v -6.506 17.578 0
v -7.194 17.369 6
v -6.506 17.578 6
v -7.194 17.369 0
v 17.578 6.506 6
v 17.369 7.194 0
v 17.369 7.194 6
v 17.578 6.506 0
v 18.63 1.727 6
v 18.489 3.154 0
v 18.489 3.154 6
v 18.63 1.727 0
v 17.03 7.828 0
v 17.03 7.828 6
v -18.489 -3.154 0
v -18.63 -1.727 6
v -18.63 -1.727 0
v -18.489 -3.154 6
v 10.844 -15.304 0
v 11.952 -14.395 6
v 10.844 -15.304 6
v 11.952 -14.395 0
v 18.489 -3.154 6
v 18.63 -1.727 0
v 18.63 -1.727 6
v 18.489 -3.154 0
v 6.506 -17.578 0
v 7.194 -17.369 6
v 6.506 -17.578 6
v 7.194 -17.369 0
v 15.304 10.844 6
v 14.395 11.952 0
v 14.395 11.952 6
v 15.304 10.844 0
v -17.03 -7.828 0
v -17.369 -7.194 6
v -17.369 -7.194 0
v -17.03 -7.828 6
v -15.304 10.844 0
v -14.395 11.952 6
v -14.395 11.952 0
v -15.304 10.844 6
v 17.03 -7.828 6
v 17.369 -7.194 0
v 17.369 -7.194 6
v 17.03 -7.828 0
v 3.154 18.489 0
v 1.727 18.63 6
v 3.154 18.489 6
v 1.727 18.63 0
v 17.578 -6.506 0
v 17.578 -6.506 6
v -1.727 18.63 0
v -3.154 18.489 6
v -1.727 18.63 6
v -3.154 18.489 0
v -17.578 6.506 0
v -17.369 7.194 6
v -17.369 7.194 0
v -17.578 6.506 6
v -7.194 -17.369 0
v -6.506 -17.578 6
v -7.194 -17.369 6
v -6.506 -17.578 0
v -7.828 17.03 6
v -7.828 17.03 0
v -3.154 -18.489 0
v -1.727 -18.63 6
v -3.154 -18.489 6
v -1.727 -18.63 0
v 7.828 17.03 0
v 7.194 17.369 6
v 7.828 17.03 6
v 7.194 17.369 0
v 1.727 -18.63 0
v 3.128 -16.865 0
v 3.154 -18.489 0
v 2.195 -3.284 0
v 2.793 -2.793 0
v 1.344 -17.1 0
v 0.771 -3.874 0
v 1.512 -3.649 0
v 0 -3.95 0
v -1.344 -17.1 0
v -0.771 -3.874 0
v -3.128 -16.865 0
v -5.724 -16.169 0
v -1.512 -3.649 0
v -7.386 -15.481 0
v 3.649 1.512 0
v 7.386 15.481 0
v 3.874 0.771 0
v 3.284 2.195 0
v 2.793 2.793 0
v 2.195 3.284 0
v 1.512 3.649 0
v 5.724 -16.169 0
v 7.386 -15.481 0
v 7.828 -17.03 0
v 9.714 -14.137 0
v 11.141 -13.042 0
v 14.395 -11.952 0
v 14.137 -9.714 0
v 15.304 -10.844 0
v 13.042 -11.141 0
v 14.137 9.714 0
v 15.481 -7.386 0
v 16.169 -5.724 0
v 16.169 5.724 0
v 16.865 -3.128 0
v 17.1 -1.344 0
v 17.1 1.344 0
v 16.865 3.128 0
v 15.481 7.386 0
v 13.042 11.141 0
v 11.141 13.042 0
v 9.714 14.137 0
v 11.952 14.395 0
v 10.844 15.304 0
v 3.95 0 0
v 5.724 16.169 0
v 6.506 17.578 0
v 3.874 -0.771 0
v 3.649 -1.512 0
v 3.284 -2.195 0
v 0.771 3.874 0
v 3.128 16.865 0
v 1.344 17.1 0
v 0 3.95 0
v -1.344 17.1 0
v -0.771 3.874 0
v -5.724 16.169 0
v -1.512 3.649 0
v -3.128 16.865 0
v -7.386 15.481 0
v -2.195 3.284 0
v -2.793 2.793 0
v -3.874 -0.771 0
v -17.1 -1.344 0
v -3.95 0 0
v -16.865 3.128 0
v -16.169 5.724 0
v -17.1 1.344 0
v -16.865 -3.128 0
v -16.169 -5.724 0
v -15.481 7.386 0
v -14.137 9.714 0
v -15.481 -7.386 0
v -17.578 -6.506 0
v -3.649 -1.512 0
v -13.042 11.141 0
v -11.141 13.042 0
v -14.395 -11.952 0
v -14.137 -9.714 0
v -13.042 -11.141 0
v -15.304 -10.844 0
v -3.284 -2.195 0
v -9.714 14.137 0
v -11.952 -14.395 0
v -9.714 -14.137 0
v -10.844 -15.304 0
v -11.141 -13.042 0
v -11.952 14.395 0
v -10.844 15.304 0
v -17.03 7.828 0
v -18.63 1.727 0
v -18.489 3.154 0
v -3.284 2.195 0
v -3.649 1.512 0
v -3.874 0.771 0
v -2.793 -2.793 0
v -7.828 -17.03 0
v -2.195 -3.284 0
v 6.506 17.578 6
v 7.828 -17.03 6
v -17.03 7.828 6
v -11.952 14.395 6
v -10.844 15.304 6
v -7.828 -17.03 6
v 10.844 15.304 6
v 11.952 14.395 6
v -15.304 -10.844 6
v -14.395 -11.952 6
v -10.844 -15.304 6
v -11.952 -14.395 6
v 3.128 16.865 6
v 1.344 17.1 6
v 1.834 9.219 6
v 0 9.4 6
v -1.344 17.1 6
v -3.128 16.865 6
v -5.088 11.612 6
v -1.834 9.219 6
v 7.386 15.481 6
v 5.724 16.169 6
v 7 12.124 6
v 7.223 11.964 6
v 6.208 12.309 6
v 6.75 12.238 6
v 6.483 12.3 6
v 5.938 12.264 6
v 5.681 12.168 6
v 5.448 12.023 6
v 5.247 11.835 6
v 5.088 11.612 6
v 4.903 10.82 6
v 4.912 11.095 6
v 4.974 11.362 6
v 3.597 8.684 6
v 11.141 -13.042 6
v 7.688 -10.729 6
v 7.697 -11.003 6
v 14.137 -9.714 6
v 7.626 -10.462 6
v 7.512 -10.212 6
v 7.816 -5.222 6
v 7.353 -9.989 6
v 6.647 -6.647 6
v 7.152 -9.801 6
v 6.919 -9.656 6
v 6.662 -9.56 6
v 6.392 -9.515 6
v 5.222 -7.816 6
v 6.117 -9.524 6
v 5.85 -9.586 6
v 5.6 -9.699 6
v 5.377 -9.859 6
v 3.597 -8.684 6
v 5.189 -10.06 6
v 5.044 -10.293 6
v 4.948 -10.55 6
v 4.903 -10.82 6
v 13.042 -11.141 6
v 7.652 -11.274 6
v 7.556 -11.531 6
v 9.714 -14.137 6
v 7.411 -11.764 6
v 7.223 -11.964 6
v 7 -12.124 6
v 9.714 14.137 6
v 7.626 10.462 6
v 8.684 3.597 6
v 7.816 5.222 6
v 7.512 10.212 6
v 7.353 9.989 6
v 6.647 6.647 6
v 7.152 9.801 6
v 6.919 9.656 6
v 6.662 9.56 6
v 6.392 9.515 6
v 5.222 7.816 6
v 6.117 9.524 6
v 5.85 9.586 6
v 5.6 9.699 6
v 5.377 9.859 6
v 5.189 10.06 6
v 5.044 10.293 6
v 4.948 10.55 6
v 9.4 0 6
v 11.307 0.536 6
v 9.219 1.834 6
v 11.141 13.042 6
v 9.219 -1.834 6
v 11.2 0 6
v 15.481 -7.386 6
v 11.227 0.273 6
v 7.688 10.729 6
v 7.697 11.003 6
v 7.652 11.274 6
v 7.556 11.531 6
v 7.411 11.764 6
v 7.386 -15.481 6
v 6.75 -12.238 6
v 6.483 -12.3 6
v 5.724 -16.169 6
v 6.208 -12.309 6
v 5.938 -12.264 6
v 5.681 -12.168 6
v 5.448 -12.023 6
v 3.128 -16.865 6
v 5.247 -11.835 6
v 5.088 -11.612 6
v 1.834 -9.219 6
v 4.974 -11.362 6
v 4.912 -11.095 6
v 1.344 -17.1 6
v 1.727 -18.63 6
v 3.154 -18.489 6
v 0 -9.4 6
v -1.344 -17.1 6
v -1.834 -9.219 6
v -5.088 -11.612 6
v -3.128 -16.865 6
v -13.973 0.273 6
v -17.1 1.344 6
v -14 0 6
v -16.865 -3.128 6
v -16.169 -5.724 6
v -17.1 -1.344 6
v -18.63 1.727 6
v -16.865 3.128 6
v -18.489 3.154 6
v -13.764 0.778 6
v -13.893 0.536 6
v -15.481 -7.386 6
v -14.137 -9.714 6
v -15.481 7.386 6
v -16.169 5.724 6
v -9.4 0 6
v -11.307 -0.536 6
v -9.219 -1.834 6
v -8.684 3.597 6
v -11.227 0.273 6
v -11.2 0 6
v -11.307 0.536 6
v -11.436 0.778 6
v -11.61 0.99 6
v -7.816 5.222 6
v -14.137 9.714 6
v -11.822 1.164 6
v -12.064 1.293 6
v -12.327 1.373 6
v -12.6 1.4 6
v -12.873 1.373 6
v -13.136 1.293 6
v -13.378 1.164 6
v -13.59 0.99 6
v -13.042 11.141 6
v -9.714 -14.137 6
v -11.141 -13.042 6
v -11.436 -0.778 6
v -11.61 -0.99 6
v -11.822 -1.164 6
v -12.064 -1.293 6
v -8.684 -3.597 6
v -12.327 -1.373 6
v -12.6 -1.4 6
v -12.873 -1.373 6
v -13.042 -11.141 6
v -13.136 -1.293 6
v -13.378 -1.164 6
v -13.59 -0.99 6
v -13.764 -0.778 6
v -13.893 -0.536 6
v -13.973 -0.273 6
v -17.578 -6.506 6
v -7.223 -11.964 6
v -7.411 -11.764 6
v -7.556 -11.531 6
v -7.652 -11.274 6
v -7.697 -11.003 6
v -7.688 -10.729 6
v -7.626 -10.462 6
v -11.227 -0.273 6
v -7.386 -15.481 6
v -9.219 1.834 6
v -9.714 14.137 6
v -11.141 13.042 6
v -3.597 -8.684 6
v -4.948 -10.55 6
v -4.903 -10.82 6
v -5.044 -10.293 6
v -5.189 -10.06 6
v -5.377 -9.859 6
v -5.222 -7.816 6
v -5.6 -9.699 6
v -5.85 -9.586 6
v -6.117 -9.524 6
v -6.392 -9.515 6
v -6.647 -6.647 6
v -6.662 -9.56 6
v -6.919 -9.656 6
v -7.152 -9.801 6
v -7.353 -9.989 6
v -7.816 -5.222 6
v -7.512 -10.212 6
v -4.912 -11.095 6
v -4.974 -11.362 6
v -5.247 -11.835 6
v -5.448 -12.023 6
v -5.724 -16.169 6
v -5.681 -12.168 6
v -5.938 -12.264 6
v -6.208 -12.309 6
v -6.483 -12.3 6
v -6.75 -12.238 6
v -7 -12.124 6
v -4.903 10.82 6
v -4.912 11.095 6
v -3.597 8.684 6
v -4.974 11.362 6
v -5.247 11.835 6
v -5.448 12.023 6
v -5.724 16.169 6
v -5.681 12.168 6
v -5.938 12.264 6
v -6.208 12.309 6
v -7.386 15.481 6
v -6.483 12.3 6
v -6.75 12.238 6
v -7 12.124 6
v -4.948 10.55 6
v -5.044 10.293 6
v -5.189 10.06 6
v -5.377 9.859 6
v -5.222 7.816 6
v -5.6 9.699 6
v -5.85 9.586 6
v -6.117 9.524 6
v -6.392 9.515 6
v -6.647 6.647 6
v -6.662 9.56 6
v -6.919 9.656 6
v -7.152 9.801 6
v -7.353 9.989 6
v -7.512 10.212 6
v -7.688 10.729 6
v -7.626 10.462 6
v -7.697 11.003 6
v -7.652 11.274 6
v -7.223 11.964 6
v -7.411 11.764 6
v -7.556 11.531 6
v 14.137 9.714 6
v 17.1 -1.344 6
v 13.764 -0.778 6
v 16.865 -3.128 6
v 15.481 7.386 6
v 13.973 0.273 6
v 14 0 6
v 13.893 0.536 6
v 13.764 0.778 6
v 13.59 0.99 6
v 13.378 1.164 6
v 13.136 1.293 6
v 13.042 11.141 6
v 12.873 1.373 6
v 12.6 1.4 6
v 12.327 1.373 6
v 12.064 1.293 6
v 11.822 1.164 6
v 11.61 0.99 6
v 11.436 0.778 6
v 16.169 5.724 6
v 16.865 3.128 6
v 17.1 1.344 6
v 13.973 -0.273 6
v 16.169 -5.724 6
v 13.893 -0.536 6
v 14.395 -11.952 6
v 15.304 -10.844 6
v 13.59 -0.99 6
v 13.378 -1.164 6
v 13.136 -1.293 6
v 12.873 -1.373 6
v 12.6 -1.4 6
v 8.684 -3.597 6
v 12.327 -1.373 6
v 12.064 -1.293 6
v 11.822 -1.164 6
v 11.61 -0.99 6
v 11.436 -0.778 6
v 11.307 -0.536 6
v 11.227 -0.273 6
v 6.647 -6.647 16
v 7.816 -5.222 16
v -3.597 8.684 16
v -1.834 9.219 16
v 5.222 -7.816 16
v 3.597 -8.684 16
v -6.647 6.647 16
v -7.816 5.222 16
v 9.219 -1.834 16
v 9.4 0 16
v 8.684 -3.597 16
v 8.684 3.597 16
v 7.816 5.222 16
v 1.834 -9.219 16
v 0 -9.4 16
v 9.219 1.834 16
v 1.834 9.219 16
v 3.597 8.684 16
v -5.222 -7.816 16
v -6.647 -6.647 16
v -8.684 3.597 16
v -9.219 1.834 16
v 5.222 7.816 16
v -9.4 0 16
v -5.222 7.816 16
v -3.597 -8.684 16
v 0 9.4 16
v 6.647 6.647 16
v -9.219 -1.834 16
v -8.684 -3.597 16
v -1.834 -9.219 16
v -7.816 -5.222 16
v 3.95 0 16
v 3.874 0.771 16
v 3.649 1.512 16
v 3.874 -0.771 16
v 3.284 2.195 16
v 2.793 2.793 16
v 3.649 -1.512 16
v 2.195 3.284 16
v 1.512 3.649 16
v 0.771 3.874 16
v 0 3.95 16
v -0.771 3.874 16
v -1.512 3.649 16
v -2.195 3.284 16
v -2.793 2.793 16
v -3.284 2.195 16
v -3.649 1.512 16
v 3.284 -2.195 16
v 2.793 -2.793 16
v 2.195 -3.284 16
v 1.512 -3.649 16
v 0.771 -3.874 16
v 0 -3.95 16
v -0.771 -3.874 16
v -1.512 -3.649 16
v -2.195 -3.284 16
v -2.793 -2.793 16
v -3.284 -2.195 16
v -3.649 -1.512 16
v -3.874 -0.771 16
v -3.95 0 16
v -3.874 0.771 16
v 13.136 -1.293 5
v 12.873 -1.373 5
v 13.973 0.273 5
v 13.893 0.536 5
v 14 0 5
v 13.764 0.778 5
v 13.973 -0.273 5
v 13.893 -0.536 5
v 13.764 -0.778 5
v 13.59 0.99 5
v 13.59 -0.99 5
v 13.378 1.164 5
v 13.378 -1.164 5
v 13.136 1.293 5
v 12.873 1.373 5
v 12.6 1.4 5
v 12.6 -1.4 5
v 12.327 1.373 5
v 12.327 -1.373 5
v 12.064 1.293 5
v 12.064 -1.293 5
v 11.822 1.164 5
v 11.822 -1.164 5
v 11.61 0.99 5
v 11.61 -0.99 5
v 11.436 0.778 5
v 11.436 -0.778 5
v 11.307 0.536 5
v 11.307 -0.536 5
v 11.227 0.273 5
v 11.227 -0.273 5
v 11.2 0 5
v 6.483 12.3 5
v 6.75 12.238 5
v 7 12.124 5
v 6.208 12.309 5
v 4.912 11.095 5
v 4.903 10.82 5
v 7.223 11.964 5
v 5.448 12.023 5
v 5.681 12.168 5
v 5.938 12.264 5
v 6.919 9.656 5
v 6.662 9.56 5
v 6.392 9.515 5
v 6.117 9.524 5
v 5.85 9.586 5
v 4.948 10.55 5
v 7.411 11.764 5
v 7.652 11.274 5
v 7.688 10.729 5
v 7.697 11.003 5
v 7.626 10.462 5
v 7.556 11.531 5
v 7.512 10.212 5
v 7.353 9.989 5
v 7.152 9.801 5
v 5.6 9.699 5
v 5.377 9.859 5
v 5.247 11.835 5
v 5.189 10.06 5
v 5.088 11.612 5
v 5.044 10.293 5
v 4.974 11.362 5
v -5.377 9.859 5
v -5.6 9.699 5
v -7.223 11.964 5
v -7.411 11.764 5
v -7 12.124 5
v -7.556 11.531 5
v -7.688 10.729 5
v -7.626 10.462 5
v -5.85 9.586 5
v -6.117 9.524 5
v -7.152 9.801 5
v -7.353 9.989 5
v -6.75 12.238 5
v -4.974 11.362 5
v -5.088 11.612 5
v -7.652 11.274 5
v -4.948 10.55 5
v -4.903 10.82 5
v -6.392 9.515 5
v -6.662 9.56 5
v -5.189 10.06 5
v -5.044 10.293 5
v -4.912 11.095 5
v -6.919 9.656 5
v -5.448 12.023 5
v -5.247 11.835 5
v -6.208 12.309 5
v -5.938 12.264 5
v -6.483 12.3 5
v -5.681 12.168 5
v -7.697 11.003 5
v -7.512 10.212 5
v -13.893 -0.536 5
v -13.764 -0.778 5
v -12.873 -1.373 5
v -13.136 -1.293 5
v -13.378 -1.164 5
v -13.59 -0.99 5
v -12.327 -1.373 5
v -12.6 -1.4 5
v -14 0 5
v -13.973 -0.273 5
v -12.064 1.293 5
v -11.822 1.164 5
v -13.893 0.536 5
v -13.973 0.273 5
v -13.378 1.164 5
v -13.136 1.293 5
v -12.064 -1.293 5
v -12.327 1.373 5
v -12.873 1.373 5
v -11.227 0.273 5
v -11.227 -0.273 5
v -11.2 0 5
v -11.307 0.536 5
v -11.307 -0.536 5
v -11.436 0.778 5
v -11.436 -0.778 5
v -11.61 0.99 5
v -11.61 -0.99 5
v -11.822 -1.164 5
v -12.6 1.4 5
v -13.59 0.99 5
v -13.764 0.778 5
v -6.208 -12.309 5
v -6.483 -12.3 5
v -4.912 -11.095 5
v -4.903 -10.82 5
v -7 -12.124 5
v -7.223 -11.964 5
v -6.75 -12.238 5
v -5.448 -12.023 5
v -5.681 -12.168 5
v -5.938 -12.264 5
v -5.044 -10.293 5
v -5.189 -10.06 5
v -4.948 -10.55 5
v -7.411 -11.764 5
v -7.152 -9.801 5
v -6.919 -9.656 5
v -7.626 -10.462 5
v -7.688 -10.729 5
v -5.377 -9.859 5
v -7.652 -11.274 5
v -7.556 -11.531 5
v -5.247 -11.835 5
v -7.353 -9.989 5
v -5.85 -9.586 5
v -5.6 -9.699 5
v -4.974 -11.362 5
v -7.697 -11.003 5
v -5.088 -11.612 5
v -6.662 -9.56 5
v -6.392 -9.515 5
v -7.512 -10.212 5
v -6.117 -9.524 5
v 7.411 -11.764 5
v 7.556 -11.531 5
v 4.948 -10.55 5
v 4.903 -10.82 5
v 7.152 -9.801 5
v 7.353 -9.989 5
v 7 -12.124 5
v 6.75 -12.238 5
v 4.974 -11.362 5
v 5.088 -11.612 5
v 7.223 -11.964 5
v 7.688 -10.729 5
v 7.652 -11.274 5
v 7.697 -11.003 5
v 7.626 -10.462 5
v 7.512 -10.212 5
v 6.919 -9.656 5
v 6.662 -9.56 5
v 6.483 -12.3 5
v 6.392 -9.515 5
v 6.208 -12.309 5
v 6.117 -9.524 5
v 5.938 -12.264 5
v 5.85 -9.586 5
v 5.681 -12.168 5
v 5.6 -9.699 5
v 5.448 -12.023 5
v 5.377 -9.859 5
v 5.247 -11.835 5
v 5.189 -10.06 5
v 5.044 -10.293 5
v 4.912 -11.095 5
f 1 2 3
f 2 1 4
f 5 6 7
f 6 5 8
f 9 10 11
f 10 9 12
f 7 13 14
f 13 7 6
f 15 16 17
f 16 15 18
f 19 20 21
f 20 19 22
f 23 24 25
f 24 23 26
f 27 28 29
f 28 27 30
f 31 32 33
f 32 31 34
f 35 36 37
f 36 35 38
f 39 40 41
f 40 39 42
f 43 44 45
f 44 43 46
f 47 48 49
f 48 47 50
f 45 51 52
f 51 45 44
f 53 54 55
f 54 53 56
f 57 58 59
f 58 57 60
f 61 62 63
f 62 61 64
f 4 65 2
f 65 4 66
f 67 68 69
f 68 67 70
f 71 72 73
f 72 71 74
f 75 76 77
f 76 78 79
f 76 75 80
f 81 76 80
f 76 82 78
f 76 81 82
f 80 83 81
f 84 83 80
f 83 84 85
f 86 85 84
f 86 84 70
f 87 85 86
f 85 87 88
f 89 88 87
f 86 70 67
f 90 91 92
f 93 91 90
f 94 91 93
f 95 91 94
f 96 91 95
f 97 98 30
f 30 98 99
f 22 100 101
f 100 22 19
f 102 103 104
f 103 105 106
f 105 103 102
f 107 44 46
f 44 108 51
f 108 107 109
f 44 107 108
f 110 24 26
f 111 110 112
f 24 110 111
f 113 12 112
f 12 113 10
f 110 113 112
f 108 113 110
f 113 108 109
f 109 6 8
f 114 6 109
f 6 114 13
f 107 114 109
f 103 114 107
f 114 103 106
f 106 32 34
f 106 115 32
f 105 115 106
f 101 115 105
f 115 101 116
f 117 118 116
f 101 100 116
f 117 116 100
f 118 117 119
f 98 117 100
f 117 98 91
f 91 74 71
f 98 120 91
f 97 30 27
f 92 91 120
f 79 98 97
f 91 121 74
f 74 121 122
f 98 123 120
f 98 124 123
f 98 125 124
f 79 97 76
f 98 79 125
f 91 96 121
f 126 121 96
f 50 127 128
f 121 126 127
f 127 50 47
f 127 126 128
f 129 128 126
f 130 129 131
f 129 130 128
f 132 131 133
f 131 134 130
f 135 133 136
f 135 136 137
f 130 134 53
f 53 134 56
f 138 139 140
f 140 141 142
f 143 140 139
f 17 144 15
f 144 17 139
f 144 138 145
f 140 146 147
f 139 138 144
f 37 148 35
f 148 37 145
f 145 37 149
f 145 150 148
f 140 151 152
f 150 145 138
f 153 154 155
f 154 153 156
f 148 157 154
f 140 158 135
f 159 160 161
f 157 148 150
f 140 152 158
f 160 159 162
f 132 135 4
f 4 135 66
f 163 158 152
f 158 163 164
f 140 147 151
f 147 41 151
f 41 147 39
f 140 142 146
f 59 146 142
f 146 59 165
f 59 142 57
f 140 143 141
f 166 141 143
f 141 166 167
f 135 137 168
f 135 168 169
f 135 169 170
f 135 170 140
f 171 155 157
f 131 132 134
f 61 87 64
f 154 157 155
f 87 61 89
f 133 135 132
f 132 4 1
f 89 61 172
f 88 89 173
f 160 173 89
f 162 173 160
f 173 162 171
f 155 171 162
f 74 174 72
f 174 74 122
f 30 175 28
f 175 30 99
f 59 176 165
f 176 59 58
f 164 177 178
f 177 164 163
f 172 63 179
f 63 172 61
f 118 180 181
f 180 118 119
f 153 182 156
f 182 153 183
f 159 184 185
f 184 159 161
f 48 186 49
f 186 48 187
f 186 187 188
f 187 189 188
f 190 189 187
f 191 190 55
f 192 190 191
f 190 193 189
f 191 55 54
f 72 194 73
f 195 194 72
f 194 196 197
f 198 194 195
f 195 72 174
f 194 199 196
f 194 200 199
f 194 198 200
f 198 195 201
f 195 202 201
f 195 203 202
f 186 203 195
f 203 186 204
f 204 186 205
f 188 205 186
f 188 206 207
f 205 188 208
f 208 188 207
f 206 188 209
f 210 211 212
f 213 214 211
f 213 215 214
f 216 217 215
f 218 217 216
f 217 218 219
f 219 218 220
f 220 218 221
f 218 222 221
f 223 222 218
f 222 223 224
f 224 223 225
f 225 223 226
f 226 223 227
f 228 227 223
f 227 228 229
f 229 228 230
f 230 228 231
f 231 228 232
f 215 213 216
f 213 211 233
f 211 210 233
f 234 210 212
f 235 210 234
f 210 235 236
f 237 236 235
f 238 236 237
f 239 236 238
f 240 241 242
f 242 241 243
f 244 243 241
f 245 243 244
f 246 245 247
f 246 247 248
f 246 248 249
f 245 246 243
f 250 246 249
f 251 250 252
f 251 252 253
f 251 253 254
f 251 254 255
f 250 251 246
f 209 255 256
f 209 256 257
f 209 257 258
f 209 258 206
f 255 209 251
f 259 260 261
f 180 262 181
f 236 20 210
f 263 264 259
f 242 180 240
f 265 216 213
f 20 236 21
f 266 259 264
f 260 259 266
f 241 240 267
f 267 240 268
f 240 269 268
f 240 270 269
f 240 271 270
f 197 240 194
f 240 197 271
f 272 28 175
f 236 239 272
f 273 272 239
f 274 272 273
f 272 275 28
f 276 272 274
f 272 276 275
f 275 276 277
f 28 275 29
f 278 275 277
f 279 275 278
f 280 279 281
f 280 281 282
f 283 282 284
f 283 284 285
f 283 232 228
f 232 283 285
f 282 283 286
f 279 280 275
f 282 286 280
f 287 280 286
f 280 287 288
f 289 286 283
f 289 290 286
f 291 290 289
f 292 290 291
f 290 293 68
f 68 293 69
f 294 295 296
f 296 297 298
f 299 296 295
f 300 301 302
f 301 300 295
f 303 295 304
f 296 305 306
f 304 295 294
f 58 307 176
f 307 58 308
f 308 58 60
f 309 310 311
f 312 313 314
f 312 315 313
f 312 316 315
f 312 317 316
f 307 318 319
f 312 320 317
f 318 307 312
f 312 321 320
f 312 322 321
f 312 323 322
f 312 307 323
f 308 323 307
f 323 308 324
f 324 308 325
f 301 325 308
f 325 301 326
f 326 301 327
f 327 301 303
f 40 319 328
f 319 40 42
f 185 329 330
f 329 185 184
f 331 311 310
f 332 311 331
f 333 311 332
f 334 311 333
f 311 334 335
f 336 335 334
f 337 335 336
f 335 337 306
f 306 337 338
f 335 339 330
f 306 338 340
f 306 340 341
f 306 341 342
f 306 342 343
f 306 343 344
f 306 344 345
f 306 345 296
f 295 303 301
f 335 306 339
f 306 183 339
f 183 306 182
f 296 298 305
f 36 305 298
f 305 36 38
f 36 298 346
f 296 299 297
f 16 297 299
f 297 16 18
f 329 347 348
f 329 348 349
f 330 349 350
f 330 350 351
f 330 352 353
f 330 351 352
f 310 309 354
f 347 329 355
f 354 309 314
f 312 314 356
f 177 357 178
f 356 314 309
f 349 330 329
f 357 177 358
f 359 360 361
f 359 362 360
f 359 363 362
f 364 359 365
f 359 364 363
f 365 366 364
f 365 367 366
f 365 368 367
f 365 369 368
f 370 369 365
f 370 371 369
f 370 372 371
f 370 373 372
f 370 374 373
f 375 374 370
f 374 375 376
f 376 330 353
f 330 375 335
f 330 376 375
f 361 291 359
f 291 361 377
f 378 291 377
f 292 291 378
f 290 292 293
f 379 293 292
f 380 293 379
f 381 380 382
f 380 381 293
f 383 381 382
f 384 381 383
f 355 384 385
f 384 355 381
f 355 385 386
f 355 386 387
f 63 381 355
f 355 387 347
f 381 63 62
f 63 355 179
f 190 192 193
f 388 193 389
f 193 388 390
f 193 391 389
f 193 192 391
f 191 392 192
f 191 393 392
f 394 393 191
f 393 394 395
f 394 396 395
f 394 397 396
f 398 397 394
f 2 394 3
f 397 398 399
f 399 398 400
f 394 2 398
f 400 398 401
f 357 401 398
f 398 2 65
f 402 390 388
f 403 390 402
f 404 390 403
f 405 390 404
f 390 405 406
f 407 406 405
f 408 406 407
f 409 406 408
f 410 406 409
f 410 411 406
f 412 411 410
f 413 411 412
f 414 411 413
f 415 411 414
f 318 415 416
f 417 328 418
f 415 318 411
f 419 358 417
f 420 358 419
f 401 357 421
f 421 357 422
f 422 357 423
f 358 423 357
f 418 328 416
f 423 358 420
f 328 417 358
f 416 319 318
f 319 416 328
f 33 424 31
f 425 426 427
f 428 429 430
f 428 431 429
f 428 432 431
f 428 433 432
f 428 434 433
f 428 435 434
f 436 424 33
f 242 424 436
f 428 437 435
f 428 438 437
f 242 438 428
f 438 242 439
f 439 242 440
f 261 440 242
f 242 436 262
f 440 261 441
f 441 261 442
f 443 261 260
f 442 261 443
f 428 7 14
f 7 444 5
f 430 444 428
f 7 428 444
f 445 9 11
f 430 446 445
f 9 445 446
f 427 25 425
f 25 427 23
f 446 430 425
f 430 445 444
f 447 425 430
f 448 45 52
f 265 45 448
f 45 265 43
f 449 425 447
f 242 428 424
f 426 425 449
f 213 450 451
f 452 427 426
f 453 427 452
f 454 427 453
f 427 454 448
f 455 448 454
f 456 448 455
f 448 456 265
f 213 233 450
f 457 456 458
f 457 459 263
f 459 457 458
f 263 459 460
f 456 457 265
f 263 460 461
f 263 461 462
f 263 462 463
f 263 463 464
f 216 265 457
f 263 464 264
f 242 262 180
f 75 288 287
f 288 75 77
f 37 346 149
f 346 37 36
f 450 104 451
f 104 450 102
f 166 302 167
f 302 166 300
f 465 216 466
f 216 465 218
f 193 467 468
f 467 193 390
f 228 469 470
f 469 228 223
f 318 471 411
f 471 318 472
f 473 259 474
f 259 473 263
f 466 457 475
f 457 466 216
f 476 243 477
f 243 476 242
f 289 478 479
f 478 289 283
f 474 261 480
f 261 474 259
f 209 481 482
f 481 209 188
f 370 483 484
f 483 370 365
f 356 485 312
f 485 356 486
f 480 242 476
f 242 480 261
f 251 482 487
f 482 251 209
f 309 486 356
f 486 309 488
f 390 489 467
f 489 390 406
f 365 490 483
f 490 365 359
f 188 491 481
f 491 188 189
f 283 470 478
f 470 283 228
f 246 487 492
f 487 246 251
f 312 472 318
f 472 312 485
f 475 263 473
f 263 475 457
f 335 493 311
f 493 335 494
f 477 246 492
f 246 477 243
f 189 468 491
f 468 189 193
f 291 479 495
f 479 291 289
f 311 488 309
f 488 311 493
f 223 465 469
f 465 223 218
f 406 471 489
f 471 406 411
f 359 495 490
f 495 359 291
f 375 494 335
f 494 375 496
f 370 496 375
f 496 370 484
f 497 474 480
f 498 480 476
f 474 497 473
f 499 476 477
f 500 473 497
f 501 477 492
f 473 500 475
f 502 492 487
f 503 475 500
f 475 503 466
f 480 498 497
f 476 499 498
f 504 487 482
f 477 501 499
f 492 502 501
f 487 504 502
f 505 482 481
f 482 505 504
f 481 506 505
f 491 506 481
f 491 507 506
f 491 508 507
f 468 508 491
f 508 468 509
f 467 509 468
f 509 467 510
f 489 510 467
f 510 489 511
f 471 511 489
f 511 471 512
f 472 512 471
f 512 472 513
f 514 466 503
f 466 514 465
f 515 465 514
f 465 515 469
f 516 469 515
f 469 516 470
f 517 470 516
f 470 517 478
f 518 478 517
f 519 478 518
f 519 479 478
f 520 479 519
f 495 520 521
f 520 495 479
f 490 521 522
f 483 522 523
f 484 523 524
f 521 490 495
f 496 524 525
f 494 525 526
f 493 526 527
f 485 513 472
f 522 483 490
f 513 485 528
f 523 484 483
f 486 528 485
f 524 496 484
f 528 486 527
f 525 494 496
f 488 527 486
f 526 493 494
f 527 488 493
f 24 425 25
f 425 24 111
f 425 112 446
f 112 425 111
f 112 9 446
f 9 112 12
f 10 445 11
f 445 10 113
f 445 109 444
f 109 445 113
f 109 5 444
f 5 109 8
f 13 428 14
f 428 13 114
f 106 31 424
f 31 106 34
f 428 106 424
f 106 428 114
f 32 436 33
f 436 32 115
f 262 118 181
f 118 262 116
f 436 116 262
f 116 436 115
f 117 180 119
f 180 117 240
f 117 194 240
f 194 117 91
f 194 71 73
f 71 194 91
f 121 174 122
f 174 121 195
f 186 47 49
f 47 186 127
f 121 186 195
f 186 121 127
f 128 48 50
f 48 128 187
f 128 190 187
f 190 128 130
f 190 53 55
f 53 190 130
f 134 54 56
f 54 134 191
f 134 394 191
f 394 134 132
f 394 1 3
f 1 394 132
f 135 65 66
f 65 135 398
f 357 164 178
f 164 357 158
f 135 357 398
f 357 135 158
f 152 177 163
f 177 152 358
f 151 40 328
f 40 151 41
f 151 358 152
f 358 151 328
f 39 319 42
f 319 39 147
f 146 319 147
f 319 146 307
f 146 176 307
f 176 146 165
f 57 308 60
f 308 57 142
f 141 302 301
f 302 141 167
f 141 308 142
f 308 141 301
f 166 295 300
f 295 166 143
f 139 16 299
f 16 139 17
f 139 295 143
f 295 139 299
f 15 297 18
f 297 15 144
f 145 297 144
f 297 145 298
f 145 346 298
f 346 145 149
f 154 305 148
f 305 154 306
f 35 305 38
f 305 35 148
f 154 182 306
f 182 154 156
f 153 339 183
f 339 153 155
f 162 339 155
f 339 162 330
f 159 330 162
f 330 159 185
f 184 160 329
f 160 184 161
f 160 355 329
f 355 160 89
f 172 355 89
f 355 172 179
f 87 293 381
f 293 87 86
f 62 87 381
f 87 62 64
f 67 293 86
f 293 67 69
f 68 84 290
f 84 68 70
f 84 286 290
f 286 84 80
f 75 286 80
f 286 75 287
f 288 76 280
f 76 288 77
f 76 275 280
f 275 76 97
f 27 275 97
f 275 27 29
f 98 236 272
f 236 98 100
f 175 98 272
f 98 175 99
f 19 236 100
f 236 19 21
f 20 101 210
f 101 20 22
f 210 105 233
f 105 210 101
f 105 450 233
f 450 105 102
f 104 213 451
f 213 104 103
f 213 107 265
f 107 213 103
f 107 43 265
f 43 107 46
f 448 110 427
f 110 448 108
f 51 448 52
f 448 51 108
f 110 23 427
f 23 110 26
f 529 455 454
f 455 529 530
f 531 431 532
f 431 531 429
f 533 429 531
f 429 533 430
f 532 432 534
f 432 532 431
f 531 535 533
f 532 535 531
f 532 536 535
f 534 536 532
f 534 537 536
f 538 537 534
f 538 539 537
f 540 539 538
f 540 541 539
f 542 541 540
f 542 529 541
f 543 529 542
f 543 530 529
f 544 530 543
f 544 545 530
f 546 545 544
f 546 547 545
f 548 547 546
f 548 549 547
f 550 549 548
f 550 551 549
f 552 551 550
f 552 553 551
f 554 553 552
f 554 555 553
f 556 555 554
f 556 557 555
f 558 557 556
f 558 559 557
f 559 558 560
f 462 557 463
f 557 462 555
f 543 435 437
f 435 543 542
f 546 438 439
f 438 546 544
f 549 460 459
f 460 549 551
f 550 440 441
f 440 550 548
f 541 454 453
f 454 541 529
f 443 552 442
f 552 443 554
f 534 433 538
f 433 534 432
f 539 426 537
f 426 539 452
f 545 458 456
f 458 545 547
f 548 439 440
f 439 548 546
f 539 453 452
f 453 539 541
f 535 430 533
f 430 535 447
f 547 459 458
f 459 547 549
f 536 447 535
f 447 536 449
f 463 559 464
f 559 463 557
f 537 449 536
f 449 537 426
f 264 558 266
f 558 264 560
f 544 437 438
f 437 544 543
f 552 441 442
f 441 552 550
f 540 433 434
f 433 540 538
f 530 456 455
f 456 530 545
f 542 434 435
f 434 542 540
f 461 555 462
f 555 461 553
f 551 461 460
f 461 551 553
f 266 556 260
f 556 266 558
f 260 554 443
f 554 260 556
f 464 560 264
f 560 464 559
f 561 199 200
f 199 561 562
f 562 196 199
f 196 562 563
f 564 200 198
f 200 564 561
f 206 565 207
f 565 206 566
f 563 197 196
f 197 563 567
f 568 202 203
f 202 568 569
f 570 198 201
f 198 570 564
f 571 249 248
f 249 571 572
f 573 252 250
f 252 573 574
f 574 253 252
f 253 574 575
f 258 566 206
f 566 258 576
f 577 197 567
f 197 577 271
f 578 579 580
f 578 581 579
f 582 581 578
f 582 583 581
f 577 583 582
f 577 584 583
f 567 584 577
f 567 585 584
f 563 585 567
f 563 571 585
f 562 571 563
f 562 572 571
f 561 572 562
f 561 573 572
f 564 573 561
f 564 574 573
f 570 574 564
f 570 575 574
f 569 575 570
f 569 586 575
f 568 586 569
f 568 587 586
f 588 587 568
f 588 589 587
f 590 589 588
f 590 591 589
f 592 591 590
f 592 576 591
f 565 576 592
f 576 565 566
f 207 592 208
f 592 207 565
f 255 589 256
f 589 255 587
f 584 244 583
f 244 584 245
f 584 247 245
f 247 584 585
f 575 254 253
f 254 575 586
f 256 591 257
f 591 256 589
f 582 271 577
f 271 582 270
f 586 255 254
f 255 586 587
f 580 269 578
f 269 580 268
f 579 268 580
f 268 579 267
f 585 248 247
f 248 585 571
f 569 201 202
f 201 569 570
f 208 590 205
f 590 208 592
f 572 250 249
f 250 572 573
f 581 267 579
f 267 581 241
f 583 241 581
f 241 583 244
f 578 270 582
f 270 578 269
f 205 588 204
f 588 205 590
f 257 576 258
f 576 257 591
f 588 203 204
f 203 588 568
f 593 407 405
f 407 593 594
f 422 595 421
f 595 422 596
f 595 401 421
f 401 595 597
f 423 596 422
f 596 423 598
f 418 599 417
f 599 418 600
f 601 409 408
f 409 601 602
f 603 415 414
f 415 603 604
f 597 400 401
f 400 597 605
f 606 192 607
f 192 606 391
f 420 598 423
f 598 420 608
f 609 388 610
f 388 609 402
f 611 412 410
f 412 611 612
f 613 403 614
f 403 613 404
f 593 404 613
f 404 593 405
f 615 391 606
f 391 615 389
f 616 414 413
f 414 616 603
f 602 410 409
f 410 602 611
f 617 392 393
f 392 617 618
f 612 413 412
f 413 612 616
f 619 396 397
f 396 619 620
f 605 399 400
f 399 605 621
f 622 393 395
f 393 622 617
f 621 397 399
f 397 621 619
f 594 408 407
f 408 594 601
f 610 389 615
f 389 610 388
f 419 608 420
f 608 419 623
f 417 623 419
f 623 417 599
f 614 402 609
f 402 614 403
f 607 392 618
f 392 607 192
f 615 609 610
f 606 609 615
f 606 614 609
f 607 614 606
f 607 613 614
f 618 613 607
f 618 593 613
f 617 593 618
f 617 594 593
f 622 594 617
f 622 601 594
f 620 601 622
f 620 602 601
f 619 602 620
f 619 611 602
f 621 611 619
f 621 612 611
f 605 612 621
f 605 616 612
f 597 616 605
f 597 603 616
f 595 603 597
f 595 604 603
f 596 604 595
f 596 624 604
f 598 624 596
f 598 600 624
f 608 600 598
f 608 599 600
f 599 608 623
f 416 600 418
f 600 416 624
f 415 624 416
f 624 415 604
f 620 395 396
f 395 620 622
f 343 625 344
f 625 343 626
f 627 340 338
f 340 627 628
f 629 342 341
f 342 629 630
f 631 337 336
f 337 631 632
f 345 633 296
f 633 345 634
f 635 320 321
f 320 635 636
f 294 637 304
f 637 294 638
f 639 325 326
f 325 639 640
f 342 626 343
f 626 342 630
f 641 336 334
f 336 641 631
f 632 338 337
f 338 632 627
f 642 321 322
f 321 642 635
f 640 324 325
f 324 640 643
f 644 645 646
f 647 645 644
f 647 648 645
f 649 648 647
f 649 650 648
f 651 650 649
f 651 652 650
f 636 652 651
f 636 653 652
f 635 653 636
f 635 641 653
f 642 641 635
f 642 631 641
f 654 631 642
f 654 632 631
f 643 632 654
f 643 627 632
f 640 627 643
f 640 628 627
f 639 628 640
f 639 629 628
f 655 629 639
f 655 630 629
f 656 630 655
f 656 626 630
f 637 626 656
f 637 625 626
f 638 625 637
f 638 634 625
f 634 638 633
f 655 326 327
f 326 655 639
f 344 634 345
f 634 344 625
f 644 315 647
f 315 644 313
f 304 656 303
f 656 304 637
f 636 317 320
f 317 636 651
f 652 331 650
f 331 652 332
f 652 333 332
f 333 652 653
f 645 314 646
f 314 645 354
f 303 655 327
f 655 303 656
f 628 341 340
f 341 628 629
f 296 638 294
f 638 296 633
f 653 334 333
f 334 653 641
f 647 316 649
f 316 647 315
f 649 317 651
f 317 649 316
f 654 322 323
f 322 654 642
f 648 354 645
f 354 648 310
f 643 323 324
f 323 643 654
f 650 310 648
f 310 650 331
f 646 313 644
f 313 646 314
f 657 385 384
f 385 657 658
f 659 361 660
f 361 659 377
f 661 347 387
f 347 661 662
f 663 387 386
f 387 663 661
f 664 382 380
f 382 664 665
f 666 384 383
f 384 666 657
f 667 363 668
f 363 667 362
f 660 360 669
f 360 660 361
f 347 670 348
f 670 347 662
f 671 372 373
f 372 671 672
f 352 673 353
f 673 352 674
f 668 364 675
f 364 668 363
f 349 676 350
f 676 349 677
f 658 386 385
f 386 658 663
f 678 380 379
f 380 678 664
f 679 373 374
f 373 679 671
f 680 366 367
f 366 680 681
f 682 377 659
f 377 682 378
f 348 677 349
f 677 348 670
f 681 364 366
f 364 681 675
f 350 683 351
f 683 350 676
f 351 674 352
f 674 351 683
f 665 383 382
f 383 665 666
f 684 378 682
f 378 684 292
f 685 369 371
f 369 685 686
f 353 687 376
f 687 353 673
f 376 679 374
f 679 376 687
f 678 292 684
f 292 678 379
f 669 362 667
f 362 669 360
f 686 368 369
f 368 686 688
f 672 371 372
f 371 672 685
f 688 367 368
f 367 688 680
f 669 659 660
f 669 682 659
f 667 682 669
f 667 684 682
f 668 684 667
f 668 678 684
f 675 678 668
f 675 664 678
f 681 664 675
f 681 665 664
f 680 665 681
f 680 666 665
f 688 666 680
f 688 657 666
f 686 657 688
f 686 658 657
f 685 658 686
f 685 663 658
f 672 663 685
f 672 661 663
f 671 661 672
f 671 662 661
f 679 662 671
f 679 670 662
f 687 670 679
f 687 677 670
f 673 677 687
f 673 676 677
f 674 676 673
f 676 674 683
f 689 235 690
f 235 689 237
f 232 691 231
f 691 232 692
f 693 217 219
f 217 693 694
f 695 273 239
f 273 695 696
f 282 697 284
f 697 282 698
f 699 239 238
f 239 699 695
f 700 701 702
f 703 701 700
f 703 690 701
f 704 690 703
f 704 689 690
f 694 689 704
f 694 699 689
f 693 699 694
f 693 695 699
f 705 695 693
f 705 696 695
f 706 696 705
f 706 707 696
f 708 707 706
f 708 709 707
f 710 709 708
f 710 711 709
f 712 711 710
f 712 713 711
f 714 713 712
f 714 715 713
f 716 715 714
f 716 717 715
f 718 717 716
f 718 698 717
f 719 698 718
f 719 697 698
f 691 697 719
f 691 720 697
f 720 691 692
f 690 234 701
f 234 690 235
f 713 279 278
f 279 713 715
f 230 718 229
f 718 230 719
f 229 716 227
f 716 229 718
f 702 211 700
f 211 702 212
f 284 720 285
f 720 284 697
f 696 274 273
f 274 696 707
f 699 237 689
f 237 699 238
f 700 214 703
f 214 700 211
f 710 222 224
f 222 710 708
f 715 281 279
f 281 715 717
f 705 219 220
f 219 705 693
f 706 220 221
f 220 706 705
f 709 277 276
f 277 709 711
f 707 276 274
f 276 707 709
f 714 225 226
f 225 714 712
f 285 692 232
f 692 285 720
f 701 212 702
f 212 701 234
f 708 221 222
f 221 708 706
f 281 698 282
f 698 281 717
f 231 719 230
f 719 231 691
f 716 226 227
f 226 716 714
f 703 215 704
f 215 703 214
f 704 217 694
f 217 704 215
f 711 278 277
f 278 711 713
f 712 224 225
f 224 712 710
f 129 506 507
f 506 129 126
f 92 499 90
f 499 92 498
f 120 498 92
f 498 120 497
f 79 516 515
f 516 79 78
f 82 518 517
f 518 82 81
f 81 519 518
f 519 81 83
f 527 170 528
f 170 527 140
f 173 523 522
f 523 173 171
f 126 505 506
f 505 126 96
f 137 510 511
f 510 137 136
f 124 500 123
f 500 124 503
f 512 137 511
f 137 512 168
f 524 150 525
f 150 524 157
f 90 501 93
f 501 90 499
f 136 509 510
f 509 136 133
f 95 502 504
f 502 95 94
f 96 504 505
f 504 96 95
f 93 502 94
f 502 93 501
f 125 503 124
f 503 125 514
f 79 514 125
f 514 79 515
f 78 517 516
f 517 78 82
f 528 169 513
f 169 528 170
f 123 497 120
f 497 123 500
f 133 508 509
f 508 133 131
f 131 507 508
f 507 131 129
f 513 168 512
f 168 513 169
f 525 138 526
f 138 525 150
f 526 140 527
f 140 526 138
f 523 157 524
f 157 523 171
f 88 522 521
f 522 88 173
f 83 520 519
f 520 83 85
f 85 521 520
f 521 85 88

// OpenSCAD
$fn = 32;

// ----------------------------------------------------------------------
// Timing pulley: HTD5 24T, pitch 5 mm, 37.6 mm x 16 mm
// ----------------------------------------------------------------------

// --- parameters (mm) ---
pitch = 5;                // belt pitch
teeth = 24;               // number of grooves
belt_w = 6;               // belt width between the flanges
tip_d = 37.6;             // tip circle diameter
root_d = 35.4;            // groove bottom diameter
groove_h = 1.1;           // groove depth
tooth_w = 3.2;            // groove width at the tip circle
bore_d = 7.9;             // shaft bore
hub_d = 18.8;             // hub diameter
hub_h = 10;               // hub above the flange
bottom_z = 0;             // lowest point of the pulley
top_z = 16;               // highest point of the pulley
ring_d = 2.8;             // clamp screw hole
ring_r = 12.6;            // clamp screw radius

module rim() {
  cylinder(h = belt_w, d = tip_d);
}

module groove_cutter() {
  /* belt tooth groove: deeper than wide, cut through the belt width */
  translate([root_d / 2, 0, 0])
    linear_extrude(height = belt_w)
      polygon(points = [[-0.6, -tooth_w * 0.42], [groove_h + 0.6, -tooth_w * 0.6],
                        [groove_h + 0.6, tooth_w * 0.6], [-0.6, tooth_w * 0.42]]);
}

module hub() {
  translate([0, 0, bottom_z]) cylinder(h = top_z - bottom_z, d = hub_d);
}

difference() {
  union() {
    rim();
    hub();
  }
  for (i = [0 : teeth - 1]) rotate([0, 0, i * 360 / teeth]) groove_cutter();
  translate([0, 0, bottom_z - 1]) cylinder(h = top_z - bottom_z + 2, d = bore_d);
  for (i = [0 : 5]) rotate([0, 0, i * 60]) translate([ring_r, 0, top_z - hub_h - 1])
    cylinder(h = hub_h + 2, d = ring_d);
}
